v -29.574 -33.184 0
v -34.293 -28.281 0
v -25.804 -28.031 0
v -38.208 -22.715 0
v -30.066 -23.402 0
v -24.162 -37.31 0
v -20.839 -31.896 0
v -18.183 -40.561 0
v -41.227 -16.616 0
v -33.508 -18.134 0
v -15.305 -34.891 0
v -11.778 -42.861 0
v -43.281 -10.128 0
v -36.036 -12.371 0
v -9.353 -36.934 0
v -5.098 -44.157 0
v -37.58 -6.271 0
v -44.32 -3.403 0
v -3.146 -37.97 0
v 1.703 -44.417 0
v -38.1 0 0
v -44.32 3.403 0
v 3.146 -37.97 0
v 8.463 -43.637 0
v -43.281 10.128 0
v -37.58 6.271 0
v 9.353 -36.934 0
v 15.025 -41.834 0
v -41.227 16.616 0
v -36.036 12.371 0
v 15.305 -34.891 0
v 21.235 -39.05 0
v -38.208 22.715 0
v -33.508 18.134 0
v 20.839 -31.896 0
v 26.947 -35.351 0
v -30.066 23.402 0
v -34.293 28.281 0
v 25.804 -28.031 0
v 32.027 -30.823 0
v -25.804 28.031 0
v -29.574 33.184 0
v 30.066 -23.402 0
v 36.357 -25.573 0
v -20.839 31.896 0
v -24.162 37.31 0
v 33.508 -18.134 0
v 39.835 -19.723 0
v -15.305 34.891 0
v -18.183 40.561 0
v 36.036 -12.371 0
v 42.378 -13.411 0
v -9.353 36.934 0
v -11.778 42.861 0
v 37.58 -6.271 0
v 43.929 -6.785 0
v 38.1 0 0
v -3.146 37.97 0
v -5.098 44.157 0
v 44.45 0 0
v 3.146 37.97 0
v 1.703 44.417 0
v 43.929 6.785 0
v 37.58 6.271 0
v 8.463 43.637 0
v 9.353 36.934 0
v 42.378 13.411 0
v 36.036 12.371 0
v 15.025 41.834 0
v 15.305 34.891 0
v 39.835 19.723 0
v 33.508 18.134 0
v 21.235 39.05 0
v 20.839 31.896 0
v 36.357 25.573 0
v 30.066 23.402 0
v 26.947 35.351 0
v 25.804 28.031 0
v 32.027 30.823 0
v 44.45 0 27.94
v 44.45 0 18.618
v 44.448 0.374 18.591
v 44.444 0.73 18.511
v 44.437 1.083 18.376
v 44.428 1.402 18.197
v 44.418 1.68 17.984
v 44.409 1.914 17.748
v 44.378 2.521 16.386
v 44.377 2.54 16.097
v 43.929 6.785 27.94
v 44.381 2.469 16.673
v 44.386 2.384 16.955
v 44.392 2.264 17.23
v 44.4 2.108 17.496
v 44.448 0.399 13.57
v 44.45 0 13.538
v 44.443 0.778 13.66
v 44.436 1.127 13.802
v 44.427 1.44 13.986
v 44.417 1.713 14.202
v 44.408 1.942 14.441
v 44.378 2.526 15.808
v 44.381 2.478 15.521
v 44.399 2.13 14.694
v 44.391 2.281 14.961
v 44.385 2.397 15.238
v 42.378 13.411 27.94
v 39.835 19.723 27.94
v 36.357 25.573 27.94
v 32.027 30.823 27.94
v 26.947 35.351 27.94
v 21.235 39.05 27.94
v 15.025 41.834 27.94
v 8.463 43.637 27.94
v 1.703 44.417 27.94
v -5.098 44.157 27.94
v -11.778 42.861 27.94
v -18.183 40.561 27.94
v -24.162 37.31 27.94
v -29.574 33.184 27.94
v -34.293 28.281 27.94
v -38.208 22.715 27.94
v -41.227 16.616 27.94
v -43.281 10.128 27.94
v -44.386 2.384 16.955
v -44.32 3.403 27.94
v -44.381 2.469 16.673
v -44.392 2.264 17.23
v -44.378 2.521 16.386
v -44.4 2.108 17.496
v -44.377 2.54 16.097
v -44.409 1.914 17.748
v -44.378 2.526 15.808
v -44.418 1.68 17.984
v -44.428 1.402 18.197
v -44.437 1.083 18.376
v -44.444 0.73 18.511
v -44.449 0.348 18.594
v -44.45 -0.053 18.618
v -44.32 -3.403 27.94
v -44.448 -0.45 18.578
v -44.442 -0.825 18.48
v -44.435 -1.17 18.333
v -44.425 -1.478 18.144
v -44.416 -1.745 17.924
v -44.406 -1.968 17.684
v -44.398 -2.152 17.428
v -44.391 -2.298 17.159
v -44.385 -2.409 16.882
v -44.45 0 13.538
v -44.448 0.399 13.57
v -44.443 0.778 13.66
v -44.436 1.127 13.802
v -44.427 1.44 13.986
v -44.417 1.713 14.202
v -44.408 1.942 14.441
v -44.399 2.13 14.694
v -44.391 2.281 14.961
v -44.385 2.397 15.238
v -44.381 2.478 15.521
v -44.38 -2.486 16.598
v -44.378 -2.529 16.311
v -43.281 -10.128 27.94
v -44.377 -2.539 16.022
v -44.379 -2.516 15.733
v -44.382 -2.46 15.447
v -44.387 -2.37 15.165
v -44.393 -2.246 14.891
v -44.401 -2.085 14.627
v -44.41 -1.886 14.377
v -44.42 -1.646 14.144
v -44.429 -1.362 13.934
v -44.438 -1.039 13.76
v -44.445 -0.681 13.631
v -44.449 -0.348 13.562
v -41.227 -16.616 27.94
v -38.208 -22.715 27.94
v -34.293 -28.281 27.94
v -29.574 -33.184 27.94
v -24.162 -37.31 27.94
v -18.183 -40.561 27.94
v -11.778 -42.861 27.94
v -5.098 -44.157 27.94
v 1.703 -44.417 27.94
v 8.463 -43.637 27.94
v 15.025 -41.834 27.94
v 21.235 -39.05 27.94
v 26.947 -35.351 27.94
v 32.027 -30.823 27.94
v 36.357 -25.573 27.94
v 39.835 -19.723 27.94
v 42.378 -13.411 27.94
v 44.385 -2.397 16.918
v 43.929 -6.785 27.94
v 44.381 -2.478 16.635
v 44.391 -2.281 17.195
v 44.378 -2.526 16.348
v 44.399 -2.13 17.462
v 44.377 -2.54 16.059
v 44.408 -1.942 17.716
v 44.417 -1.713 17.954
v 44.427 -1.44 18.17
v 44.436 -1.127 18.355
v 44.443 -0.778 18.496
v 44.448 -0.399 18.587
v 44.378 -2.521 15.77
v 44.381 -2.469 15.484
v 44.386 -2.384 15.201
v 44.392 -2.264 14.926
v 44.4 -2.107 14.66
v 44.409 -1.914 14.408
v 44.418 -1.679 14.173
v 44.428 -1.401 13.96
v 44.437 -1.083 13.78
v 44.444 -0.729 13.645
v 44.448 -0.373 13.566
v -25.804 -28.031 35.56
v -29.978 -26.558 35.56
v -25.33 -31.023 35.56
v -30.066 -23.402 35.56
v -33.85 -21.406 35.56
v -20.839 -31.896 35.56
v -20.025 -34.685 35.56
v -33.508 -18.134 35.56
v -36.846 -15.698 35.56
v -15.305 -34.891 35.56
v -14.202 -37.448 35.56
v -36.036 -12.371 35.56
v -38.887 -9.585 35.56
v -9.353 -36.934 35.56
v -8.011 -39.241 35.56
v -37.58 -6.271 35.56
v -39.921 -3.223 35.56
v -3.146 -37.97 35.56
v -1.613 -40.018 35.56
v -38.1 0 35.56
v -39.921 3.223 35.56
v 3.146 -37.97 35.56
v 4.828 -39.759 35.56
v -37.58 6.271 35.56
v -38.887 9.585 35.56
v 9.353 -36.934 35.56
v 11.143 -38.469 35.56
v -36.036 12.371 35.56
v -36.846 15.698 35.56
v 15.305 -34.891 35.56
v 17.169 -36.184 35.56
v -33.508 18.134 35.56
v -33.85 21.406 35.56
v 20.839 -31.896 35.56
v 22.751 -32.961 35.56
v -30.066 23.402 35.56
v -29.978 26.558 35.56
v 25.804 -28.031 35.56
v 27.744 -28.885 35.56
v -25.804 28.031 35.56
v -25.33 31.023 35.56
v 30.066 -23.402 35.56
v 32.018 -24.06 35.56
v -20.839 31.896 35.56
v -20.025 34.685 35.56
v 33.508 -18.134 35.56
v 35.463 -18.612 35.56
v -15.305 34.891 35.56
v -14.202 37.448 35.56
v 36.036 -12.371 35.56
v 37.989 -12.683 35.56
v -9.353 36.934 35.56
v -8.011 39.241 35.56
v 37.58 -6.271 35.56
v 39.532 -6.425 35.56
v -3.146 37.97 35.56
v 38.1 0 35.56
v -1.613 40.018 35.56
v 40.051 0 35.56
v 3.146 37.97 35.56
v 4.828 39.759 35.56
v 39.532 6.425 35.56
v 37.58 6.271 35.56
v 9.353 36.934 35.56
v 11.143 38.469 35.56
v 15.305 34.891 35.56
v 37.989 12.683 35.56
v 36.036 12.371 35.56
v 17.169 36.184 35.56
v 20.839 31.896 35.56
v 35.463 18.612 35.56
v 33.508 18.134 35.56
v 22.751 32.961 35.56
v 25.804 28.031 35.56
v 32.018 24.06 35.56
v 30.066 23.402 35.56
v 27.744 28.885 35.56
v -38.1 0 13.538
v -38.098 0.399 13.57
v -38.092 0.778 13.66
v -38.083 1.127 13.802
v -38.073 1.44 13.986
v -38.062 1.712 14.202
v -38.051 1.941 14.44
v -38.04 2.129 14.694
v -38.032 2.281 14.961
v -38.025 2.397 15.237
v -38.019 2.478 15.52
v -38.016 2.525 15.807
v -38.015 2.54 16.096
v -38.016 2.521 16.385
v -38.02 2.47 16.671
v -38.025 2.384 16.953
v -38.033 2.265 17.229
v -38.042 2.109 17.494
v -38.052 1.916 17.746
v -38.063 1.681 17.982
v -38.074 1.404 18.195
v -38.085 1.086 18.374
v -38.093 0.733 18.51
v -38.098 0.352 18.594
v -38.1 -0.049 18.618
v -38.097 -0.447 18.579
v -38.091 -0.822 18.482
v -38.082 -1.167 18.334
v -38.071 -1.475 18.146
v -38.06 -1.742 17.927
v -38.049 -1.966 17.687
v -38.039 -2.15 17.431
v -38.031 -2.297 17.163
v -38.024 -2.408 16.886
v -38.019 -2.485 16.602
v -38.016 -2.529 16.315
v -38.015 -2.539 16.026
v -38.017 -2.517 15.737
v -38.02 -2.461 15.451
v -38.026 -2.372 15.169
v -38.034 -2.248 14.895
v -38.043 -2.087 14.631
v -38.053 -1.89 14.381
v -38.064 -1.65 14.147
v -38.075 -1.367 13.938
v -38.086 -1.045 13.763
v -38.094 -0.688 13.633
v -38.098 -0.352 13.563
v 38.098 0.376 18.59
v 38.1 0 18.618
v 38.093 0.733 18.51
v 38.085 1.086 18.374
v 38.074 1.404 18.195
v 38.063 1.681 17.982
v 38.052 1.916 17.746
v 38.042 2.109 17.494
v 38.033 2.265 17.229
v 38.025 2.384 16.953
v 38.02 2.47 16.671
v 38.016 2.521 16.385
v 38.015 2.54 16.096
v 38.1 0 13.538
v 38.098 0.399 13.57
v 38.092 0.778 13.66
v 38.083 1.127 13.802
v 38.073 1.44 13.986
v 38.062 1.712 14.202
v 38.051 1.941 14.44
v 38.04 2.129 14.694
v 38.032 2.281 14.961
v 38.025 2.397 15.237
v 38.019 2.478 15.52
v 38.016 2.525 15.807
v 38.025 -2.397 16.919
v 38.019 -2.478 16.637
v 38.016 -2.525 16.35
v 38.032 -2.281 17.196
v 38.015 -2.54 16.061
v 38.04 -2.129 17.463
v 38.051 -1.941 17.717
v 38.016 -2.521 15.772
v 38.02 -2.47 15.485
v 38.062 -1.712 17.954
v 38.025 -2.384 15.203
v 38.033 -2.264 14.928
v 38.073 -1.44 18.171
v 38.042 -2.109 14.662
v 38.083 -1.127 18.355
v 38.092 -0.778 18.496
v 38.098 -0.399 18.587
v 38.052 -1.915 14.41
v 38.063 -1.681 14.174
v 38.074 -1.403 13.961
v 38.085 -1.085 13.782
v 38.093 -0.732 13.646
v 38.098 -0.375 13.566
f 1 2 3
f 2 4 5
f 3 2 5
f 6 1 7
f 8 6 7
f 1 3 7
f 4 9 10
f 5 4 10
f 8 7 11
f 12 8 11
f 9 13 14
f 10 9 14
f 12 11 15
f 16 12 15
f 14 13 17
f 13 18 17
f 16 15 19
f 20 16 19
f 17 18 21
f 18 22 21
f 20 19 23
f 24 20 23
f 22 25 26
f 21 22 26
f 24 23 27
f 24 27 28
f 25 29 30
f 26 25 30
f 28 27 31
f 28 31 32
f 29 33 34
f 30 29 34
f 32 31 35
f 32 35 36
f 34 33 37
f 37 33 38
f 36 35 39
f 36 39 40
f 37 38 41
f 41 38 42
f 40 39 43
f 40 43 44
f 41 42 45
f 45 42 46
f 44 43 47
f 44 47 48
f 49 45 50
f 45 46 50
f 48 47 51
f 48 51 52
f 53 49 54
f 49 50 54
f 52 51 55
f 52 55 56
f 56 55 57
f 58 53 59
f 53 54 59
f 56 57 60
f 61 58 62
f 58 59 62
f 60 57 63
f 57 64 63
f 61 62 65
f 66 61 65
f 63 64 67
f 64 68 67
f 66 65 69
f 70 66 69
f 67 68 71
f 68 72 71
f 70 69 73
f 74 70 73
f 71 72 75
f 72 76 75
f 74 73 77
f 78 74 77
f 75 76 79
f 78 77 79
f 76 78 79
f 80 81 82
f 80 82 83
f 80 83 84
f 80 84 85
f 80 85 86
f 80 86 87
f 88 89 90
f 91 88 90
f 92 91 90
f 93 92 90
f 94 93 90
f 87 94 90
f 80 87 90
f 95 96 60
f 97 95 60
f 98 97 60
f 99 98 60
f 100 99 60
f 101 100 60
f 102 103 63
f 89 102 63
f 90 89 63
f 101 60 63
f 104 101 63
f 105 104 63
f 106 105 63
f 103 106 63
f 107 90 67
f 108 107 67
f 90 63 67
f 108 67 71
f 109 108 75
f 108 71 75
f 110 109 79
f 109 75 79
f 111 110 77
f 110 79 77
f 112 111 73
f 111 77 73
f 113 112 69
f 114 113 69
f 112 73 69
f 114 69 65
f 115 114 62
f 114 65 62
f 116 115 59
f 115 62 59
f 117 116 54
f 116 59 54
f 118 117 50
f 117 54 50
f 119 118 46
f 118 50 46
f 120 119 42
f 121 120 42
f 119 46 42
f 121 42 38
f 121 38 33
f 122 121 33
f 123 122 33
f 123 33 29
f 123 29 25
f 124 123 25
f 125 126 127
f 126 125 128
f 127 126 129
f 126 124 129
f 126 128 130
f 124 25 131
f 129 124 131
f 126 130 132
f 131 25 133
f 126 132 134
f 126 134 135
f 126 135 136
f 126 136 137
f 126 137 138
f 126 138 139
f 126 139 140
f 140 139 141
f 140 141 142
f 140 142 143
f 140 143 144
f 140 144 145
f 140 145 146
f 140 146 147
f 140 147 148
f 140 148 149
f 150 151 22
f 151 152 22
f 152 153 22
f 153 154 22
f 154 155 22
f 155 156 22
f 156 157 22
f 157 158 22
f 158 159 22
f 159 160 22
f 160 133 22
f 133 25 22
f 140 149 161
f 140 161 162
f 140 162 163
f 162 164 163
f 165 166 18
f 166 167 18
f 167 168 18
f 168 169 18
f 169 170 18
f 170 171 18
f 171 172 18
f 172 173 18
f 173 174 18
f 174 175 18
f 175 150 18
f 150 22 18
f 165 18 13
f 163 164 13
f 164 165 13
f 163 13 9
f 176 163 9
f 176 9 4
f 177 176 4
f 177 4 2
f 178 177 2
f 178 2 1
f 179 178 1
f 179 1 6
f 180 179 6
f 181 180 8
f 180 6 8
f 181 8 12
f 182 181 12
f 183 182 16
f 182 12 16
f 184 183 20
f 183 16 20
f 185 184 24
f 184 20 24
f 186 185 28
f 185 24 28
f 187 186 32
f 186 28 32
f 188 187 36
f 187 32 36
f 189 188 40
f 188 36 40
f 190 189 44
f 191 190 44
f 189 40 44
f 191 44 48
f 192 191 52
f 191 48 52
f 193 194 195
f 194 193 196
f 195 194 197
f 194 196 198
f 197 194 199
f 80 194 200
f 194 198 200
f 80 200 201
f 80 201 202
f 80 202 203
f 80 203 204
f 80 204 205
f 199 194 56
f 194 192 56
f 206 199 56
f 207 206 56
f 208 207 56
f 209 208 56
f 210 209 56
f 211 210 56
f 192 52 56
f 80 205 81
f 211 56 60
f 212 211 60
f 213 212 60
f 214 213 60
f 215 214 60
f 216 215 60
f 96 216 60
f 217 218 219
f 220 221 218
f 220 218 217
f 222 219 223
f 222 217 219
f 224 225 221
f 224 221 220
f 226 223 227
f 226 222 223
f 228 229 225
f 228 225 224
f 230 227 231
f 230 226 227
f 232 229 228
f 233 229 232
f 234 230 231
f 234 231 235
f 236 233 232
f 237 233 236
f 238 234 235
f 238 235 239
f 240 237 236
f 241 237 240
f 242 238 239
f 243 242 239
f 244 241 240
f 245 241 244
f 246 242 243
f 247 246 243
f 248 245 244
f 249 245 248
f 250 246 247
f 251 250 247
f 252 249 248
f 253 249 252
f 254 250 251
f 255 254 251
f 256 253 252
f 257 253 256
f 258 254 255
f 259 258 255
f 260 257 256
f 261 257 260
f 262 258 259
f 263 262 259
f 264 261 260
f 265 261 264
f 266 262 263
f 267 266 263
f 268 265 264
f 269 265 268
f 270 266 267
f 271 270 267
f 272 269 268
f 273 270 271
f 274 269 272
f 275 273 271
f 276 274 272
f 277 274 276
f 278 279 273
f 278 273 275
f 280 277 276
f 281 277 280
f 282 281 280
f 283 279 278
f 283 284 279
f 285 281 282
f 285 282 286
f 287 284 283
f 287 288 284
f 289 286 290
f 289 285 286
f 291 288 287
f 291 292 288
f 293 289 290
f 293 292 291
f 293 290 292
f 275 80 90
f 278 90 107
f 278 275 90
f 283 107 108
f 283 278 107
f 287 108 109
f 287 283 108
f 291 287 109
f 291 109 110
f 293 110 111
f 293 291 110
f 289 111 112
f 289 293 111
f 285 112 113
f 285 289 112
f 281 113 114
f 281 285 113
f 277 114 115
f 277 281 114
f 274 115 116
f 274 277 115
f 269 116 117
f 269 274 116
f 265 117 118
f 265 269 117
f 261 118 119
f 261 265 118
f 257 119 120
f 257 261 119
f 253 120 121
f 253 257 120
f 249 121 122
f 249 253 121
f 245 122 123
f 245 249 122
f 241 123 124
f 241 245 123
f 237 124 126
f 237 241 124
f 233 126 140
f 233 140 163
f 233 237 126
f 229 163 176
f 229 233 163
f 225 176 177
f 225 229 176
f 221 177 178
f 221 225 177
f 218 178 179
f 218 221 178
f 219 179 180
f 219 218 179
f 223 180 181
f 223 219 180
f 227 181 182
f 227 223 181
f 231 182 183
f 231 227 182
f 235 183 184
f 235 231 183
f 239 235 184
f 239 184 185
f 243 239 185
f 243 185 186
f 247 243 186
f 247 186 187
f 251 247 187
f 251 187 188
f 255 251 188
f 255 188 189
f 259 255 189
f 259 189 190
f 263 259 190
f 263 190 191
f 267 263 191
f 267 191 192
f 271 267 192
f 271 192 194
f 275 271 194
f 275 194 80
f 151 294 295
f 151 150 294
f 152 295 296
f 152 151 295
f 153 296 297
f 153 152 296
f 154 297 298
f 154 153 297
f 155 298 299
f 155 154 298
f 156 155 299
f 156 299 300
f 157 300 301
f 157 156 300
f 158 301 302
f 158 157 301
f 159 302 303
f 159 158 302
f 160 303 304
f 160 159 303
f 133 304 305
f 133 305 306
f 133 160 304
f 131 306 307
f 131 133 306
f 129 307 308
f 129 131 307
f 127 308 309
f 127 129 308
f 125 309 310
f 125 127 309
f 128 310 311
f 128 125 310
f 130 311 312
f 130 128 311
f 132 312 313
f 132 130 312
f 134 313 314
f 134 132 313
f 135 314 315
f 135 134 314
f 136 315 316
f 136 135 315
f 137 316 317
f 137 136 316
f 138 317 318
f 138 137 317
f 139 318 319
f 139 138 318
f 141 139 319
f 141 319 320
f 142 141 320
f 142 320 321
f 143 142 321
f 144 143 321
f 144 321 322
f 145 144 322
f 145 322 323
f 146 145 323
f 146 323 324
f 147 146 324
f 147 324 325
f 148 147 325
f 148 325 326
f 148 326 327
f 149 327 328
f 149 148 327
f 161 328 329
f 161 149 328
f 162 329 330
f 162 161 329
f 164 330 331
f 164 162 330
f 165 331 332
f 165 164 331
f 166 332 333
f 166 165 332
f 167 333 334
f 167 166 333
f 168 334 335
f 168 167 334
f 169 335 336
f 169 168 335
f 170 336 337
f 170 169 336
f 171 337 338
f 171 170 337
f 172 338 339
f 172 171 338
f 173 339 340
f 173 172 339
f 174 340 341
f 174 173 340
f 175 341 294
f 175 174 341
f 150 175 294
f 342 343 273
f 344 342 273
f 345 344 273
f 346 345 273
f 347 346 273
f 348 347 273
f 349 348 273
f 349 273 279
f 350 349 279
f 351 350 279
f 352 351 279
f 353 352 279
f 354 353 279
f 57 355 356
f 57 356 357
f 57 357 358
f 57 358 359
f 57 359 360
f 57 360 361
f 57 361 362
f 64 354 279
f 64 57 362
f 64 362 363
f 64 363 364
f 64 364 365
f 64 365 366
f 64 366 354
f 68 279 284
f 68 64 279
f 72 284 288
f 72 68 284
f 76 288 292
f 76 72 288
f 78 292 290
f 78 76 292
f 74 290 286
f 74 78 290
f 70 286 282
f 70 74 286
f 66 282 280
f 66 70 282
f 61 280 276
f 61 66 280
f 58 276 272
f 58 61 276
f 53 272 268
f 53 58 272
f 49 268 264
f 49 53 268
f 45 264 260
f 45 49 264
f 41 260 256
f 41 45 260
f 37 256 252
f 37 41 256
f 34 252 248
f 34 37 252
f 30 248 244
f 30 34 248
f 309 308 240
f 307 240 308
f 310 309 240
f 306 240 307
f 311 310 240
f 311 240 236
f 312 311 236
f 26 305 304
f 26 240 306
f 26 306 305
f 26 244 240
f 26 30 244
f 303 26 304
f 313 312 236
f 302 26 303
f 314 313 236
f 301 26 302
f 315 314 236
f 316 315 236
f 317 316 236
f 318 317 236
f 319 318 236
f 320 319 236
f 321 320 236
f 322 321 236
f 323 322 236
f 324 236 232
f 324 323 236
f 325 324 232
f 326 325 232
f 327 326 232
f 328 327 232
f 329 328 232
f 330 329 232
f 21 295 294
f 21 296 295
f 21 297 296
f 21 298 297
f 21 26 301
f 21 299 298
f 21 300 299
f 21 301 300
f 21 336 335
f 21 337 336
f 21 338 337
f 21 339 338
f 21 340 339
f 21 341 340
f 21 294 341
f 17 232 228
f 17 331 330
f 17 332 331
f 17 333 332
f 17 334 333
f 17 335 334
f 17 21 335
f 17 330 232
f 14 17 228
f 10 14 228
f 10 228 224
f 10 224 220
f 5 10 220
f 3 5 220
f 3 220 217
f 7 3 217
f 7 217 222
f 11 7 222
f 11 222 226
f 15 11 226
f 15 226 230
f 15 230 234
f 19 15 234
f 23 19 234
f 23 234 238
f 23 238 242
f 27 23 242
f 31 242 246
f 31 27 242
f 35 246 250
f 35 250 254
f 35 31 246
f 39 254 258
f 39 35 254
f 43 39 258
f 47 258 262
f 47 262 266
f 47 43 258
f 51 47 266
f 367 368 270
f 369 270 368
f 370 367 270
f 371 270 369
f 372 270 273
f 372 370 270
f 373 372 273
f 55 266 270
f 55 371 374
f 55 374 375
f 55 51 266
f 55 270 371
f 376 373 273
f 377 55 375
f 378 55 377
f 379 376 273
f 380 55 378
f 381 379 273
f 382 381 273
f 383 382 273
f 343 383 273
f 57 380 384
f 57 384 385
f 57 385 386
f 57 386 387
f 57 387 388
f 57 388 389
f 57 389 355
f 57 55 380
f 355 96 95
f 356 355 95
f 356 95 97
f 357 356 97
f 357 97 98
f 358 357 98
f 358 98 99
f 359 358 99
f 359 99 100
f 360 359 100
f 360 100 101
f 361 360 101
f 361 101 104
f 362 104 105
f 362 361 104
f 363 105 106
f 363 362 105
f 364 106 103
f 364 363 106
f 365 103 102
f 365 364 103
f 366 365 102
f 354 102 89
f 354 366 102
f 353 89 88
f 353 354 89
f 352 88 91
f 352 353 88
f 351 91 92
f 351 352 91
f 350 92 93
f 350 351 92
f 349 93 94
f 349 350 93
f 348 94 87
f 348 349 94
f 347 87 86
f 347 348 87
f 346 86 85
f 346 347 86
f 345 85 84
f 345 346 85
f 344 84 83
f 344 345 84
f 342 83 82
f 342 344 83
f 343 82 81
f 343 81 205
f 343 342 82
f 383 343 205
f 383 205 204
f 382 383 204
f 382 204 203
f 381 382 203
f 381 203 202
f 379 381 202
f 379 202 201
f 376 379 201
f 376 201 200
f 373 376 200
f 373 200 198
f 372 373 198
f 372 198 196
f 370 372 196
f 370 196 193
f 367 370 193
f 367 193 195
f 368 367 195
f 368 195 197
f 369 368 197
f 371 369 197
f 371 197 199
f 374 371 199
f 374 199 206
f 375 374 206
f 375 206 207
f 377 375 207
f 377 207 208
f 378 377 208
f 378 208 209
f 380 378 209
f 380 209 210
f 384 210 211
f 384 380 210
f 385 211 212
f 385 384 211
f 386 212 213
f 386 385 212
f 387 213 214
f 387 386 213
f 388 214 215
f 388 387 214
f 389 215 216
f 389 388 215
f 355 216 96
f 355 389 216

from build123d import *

# Parameters (mm, degrees)
SKETCH1_R               = 44.45
SKETCH1_R_2             = 38.1
BOSS_EXTRUDE1_DEPTH     = 35.56
CHAMFER1_SIZE           = 7.62
CHAMFER1_SIZE2          = 4.399409051
CUT_EXTRUDE1_DEPTH      = 73.222701417
CUT_EXTRUDE1_DEPTH_BACK = 73.222701417
SKETCH2_R               = 2.54


with BuildPart() as part:
    # Sketch1 → Boss-Extrude1 (new body)
    with BuildSketch(Plane.XY):
        Circle(SKETCH1_R)
        Circle(SKETCH1_R_2, mode=Mode.SUBTRACT)
    extrude(amount=BOSS_EXTRUDE1_DEPTH)

    # Chamfer1
    chamfer1_edges = [part.edges().sort_by_distance(p)[0] for p in [
        (-44.45, 0, 35.56),
    ]]
    chamfer1_side = [part.faces().sort_by_distance(p)[0] for p in [
        (-44.45, 0, 17.78),
    ]]
    chamfer(chamfer1_edges, length=CHAMFER1_SIZE, length2=CHAMFER1_SIZE2, reference=chamfer1_side[0])

    # Sketch2 → Cut-Extrude1 (cut, two sides: drawn at the far end of the back side and taken through both)
    with BuildSketch(Plane(origin=(0, 0, 0), x_dir=(0, 0, -1), z_dir=(1, 0, 0)).offset(-CUT_EXTRUDE1_DEPTH_BACK)):
        with Locations((-16.0782, 0)):
            Circle(SKETCH2_R)
    extrude(amount=CUT_EXTRUDE1_DEPTH + CUT_EXTRUDE1_DEPTH_BACK, mode=Mode.SUBTRACT)


solid = part.part
